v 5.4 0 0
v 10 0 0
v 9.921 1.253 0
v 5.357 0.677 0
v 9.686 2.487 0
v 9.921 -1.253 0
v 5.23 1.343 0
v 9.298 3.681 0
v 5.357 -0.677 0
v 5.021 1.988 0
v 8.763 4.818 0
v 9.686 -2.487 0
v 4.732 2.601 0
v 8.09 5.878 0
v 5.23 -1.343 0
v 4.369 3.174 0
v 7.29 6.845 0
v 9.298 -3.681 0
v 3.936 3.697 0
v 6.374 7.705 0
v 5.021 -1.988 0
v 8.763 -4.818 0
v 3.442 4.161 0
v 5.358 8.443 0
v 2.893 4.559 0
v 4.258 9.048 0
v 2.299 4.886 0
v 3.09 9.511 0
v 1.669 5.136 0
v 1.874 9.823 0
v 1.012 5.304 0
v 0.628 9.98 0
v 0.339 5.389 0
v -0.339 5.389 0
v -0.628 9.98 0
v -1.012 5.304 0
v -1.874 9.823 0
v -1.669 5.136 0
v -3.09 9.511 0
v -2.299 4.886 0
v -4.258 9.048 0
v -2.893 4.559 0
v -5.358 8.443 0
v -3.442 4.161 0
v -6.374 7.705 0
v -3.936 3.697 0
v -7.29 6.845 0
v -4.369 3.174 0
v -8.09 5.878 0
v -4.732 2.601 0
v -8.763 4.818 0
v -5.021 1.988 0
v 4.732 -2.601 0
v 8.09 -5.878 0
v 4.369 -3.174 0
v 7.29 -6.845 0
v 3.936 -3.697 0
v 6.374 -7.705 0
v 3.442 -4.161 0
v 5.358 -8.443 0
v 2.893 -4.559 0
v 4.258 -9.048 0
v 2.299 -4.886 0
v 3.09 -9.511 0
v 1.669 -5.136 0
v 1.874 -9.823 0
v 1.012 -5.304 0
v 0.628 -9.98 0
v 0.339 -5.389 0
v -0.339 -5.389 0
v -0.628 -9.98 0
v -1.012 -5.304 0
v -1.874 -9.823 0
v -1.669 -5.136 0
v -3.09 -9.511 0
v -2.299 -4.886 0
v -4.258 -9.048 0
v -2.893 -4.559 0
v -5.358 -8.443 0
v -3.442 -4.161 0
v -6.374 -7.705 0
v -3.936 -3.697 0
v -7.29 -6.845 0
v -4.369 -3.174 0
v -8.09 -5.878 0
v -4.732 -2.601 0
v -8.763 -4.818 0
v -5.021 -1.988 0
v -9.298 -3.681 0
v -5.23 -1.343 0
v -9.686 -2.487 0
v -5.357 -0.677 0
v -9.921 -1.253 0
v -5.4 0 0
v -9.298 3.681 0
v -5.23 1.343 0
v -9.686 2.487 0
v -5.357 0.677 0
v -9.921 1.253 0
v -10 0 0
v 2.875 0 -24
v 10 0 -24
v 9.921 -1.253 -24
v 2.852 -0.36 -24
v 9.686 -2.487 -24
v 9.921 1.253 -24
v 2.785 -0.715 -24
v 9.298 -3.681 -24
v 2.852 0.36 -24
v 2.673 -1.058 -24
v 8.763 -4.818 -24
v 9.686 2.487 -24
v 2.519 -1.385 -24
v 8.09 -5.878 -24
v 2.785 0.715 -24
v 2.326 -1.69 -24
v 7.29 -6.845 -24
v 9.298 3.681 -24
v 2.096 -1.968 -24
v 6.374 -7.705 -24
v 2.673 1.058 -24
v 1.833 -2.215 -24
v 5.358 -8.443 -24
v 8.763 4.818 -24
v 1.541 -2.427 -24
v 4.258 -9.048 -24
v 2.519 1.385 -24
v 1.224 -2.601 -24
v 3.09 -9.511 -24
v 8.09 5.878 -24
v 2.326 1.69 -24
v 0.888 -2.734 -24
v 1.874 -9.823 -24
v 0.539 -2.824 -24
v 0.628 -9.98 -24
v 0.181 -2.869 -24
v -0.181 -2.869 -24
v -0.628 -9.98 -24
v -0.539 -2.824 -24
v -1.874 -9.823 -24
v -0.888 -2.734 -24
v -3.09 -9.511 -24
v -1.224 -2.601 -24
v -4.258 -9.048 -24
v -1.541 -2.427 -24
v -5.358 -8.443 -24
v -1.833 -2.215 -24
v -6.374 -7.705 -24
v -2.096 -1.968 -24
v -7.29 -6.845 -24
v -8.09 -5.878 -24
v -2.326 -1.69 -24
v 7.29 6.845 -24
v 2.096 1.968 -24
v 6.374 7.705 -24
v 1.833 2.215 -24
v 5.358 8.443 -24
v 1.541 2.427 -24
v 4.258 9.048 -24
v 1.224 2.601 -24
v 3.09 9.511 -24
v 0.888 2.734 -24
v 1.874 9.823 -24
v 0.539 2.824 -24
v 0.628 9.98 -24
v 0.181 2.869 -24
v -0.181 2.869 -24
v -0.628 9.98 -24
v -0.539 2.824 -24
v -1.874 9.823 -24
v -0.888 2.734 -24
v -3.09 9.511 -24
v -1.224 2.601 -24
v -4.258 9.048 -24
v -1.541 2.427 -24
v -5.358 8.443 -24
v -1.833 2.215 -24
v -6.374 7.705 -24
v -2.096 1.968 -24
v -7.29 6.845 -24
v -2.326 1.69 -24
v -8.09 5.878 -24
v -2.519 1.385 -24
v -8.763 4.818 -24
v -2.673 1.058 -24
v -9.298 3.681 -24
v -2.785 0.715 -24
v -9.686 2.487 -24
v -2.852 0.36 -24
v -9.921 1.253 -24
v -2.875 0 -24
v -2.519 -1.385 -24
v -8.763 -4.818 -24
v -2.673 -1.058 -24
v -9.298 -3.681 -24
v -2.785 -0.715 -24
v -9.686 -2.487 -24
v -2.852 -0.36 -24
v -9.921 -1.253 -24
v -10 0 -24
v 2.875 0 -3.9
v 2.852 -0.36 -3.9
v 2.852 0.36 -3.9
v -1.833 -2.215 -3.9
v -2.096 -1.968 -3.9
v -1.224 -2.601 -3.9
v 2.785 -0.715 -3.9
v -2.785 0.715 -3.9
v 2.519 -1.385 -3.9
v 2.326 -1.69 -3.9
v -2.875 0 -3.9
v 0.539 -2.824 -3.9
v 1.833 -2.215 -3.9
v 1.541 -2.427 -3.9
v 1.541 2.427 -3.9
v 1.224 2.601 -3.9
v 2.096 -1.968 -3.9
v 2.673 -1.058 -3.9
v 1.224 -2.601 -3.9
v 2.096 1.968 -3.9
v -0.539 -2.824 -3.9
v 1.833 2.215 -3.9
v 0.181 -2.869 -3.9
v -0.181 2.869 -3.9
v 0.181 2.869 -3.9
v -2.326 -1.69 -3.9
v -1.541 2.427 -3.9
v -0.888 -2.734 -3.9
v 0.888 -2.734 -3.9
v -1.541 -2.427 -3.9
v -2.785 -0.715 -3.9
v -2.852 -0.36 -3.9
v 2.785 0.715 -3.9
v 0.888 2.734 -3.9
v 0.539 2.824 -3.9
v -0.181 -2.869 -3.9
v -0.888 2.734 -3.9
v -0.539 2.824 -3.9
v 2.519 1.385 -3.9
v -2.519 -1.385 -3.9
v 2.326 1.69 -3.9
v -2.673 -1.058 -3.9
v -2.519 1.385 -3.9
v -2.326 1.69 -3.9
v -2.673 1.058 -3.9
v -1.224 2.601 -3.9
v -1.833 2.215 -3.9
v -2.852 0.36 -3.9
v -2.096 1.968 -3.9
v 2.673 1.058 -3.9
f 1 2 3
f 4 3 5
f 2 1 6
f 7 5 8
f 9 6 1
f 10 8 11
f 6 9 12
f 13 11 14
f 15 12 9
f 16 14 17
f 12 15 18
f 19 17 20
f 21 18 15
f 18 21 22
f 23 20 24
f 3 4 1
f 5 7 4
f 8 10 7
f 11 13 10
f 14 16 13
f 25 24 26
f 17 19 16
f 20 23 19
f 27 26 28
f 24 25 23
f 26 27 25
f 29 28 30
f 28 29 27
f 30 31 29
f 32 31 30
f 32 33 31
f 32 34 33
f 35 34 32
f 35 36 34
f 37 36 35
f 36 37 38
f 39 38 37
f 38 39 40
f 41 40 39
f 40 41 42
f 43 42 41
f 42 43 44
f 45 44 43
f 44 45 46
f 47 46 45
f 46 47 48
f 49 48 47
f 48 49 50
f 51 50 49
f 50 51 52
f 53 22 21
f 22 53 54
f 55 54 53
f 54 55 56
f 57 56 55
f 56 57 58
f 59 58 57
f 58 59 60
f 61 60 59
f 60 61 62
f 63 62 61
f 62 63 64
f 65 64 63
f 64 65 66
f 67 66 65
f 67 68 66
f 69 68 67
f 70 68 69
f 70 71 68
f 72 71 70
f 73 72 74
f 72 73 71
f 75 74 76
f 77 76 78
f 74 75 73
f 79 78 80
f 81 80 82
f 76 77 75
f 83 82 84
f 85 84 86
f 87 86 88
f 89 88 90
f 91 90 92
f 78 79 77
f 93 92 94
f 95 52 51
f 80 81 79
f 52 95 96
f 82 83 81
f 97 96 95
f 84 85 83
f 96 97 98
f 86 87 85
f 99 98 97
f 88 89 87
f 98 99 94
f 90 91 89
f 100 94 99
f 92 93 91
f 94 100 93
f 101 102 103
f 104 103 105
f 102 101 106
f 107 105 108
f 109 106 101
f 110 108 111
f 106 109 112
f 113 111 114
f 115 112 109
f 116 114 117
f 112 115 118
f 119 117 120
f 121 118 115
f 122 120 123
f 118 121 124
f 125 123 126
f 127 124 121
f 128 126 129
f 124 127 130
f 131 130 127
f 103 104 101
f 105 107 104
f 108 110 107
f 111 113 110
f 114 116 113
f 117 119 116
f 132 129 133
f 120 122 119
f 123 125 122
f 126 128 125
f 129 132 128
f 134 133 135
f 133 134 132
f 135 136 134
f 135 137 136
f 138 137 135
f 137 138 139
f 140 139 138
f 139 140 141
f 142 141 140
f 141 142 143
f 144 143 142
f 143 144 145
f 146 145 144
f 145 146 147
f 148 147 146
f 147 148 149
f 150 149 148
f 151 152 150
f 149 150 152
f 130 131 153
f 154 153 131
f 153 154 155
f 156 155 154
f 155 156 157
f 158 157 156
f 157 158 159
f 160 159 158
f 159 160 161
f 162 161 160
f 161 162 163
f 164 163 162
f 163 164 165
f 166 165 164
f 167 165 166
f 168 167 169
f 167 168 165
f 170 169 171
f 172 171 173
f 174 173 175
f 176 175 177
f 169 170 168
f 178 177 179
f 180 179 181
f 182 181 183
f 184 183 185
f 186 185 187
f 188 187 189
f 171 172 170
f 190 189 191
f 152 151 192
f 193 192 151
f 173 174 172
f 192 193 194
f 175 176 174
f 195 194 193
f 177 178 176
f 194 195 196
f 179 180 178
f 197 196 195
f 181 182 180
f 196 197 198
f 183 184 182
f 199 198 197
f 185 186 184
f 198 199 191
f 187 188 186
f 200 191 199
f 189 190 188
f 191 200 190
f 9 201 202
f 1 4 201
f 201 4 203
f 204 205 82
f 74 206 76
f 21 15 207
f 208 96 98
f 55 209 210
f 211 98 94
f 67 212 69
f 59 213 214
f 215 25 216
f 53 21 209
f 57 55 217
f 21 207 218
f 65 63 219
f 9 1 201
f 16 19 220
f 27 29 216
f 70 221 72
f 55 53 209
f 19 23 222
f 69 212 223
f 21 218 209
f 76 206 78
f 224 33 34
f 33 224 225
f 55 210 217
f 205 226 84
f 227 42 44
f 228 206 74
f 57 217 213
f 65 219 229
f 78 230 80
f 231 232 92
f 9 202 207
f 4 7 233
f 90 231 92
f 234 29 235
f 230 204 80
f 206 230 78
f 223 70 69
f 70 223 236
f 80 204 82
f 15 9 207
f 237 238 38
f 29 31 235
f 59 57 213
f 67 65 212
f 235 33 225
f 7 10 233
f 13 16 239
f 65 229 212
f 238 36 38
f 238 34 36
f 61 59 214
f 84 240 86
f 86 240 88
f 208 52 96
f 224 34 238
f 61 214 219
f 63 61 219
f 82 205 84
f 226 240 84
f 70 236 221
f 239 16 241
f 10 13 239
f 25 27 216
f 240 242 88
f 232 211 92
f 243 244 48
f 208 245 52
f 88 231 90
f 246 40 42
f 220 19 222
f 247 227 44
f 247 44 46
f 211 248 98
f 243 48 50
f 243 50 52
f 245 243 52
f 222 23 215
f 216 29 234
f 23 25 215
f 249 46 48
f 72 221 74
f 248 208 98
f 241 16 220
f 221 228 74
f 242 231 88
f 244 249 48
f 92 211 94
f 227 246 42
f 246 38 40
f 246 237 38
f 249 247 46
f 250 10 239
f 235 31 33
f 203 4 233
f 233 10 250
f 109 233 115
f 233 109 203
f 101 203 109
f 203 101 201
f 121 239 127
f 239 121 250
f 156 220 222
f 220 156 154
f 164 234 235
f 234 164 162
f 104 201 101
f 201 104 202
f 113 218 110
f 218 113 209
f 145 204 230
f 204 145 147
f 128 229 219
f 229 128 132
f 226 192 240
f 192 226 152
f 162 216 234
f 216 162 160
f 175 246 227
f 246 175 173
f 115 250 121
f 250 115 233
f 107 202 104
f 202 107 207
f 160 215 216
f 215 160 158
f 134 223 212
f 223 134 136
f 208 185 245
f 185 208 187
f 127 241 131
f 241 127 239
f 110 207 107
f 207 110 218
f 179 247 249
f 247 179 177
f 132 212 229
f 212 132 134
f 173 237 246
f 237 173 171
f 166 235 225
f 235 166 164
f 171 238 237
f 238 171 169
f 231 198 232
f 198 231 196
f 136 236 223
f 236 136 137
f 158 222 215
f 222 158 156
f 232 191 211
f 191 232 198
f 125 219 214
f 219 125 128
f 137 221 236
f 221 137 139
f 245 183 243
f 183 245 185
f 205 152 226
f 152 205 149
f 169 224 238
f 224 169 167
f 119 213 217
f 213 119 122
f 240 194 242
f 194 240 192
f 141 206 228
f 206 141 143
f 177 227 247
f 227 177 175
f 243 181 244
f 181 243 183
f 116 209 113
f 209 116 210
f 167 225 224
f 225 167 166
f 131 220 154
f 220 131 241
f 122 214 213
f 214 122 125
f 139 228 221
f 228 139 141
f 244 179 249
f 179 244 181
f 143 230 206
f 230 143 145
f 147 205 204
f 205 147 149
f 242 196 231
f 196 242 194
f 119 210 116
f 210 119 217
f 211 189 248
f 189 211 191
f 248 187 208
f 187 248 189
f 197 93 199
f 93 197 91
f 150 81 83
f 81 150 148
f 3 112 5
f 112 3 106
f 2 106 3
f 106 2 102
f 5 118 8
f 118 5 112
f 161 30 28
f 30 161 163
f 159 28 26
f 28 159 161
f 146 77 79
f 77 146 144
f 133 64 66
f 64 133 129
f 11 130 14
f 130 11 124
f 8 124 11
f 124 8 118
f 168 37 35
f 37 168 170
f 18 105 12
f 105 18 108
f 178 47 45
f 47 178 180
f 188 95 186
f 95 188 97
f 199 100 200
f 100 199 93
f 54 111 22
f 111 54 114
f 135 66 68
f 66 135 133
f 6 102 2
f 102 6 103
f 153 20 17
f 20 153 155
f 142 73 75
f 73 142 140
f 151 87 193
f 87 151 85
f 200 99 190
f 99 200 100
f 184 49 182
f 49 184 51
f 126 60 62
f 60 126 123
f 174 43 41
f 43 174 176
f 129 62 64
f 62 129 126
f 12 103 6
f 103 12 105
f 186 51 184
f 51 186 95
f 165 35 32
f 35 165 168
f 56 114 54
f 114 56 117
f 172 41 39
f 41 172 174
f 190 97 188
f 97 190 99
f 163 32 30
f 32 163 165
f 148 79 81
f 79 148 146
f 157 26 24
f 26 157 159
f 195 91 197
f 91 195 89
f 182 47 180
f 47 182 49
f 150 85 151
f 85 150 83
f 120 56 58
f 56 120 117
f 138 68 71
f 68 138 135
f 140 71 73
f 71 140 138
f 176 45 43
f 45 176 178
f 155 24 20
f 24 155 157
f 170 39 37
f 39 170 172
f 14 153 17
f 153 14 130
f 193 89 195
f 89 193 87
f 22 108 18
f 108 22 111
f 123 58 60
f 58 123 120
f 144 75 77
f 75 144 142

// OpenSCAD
$fn = 50;


difference() {
	union() {
		translate(v = [0, 0, -24.0000000000]) {
			cylinder(h = 24, r = 10.0000000000);
		}
		cylinder(h = 0, r = 20.0000000000);
	}
	union() {
		translate(v = [0, 0, 0]) {
			rotate(a = [0, 0, 0]) {
				difference() {
					union() {
						#translate(v = [0, 0, -24.0000000000]) {
							cylinder(h = 24, r = 2.6000000000);
						}
						#translate(v = [0, 0, -3.9000000000]) {
							cylinder(h = 3.9000000000, r1 = 2.8750000000, r2 = 5.4000000000);
						}
						#translate(v = [0, 0, -24.0000000000]) {
							cylinder(h = 24, r = 2.8750000000);
						}
						#translate(v = [0, 0, -24.0000000000]) {
							cylinder(h = 24, r = 2.6000000000);
						}
					}
					union();
				}
			}
		}
	}
}
